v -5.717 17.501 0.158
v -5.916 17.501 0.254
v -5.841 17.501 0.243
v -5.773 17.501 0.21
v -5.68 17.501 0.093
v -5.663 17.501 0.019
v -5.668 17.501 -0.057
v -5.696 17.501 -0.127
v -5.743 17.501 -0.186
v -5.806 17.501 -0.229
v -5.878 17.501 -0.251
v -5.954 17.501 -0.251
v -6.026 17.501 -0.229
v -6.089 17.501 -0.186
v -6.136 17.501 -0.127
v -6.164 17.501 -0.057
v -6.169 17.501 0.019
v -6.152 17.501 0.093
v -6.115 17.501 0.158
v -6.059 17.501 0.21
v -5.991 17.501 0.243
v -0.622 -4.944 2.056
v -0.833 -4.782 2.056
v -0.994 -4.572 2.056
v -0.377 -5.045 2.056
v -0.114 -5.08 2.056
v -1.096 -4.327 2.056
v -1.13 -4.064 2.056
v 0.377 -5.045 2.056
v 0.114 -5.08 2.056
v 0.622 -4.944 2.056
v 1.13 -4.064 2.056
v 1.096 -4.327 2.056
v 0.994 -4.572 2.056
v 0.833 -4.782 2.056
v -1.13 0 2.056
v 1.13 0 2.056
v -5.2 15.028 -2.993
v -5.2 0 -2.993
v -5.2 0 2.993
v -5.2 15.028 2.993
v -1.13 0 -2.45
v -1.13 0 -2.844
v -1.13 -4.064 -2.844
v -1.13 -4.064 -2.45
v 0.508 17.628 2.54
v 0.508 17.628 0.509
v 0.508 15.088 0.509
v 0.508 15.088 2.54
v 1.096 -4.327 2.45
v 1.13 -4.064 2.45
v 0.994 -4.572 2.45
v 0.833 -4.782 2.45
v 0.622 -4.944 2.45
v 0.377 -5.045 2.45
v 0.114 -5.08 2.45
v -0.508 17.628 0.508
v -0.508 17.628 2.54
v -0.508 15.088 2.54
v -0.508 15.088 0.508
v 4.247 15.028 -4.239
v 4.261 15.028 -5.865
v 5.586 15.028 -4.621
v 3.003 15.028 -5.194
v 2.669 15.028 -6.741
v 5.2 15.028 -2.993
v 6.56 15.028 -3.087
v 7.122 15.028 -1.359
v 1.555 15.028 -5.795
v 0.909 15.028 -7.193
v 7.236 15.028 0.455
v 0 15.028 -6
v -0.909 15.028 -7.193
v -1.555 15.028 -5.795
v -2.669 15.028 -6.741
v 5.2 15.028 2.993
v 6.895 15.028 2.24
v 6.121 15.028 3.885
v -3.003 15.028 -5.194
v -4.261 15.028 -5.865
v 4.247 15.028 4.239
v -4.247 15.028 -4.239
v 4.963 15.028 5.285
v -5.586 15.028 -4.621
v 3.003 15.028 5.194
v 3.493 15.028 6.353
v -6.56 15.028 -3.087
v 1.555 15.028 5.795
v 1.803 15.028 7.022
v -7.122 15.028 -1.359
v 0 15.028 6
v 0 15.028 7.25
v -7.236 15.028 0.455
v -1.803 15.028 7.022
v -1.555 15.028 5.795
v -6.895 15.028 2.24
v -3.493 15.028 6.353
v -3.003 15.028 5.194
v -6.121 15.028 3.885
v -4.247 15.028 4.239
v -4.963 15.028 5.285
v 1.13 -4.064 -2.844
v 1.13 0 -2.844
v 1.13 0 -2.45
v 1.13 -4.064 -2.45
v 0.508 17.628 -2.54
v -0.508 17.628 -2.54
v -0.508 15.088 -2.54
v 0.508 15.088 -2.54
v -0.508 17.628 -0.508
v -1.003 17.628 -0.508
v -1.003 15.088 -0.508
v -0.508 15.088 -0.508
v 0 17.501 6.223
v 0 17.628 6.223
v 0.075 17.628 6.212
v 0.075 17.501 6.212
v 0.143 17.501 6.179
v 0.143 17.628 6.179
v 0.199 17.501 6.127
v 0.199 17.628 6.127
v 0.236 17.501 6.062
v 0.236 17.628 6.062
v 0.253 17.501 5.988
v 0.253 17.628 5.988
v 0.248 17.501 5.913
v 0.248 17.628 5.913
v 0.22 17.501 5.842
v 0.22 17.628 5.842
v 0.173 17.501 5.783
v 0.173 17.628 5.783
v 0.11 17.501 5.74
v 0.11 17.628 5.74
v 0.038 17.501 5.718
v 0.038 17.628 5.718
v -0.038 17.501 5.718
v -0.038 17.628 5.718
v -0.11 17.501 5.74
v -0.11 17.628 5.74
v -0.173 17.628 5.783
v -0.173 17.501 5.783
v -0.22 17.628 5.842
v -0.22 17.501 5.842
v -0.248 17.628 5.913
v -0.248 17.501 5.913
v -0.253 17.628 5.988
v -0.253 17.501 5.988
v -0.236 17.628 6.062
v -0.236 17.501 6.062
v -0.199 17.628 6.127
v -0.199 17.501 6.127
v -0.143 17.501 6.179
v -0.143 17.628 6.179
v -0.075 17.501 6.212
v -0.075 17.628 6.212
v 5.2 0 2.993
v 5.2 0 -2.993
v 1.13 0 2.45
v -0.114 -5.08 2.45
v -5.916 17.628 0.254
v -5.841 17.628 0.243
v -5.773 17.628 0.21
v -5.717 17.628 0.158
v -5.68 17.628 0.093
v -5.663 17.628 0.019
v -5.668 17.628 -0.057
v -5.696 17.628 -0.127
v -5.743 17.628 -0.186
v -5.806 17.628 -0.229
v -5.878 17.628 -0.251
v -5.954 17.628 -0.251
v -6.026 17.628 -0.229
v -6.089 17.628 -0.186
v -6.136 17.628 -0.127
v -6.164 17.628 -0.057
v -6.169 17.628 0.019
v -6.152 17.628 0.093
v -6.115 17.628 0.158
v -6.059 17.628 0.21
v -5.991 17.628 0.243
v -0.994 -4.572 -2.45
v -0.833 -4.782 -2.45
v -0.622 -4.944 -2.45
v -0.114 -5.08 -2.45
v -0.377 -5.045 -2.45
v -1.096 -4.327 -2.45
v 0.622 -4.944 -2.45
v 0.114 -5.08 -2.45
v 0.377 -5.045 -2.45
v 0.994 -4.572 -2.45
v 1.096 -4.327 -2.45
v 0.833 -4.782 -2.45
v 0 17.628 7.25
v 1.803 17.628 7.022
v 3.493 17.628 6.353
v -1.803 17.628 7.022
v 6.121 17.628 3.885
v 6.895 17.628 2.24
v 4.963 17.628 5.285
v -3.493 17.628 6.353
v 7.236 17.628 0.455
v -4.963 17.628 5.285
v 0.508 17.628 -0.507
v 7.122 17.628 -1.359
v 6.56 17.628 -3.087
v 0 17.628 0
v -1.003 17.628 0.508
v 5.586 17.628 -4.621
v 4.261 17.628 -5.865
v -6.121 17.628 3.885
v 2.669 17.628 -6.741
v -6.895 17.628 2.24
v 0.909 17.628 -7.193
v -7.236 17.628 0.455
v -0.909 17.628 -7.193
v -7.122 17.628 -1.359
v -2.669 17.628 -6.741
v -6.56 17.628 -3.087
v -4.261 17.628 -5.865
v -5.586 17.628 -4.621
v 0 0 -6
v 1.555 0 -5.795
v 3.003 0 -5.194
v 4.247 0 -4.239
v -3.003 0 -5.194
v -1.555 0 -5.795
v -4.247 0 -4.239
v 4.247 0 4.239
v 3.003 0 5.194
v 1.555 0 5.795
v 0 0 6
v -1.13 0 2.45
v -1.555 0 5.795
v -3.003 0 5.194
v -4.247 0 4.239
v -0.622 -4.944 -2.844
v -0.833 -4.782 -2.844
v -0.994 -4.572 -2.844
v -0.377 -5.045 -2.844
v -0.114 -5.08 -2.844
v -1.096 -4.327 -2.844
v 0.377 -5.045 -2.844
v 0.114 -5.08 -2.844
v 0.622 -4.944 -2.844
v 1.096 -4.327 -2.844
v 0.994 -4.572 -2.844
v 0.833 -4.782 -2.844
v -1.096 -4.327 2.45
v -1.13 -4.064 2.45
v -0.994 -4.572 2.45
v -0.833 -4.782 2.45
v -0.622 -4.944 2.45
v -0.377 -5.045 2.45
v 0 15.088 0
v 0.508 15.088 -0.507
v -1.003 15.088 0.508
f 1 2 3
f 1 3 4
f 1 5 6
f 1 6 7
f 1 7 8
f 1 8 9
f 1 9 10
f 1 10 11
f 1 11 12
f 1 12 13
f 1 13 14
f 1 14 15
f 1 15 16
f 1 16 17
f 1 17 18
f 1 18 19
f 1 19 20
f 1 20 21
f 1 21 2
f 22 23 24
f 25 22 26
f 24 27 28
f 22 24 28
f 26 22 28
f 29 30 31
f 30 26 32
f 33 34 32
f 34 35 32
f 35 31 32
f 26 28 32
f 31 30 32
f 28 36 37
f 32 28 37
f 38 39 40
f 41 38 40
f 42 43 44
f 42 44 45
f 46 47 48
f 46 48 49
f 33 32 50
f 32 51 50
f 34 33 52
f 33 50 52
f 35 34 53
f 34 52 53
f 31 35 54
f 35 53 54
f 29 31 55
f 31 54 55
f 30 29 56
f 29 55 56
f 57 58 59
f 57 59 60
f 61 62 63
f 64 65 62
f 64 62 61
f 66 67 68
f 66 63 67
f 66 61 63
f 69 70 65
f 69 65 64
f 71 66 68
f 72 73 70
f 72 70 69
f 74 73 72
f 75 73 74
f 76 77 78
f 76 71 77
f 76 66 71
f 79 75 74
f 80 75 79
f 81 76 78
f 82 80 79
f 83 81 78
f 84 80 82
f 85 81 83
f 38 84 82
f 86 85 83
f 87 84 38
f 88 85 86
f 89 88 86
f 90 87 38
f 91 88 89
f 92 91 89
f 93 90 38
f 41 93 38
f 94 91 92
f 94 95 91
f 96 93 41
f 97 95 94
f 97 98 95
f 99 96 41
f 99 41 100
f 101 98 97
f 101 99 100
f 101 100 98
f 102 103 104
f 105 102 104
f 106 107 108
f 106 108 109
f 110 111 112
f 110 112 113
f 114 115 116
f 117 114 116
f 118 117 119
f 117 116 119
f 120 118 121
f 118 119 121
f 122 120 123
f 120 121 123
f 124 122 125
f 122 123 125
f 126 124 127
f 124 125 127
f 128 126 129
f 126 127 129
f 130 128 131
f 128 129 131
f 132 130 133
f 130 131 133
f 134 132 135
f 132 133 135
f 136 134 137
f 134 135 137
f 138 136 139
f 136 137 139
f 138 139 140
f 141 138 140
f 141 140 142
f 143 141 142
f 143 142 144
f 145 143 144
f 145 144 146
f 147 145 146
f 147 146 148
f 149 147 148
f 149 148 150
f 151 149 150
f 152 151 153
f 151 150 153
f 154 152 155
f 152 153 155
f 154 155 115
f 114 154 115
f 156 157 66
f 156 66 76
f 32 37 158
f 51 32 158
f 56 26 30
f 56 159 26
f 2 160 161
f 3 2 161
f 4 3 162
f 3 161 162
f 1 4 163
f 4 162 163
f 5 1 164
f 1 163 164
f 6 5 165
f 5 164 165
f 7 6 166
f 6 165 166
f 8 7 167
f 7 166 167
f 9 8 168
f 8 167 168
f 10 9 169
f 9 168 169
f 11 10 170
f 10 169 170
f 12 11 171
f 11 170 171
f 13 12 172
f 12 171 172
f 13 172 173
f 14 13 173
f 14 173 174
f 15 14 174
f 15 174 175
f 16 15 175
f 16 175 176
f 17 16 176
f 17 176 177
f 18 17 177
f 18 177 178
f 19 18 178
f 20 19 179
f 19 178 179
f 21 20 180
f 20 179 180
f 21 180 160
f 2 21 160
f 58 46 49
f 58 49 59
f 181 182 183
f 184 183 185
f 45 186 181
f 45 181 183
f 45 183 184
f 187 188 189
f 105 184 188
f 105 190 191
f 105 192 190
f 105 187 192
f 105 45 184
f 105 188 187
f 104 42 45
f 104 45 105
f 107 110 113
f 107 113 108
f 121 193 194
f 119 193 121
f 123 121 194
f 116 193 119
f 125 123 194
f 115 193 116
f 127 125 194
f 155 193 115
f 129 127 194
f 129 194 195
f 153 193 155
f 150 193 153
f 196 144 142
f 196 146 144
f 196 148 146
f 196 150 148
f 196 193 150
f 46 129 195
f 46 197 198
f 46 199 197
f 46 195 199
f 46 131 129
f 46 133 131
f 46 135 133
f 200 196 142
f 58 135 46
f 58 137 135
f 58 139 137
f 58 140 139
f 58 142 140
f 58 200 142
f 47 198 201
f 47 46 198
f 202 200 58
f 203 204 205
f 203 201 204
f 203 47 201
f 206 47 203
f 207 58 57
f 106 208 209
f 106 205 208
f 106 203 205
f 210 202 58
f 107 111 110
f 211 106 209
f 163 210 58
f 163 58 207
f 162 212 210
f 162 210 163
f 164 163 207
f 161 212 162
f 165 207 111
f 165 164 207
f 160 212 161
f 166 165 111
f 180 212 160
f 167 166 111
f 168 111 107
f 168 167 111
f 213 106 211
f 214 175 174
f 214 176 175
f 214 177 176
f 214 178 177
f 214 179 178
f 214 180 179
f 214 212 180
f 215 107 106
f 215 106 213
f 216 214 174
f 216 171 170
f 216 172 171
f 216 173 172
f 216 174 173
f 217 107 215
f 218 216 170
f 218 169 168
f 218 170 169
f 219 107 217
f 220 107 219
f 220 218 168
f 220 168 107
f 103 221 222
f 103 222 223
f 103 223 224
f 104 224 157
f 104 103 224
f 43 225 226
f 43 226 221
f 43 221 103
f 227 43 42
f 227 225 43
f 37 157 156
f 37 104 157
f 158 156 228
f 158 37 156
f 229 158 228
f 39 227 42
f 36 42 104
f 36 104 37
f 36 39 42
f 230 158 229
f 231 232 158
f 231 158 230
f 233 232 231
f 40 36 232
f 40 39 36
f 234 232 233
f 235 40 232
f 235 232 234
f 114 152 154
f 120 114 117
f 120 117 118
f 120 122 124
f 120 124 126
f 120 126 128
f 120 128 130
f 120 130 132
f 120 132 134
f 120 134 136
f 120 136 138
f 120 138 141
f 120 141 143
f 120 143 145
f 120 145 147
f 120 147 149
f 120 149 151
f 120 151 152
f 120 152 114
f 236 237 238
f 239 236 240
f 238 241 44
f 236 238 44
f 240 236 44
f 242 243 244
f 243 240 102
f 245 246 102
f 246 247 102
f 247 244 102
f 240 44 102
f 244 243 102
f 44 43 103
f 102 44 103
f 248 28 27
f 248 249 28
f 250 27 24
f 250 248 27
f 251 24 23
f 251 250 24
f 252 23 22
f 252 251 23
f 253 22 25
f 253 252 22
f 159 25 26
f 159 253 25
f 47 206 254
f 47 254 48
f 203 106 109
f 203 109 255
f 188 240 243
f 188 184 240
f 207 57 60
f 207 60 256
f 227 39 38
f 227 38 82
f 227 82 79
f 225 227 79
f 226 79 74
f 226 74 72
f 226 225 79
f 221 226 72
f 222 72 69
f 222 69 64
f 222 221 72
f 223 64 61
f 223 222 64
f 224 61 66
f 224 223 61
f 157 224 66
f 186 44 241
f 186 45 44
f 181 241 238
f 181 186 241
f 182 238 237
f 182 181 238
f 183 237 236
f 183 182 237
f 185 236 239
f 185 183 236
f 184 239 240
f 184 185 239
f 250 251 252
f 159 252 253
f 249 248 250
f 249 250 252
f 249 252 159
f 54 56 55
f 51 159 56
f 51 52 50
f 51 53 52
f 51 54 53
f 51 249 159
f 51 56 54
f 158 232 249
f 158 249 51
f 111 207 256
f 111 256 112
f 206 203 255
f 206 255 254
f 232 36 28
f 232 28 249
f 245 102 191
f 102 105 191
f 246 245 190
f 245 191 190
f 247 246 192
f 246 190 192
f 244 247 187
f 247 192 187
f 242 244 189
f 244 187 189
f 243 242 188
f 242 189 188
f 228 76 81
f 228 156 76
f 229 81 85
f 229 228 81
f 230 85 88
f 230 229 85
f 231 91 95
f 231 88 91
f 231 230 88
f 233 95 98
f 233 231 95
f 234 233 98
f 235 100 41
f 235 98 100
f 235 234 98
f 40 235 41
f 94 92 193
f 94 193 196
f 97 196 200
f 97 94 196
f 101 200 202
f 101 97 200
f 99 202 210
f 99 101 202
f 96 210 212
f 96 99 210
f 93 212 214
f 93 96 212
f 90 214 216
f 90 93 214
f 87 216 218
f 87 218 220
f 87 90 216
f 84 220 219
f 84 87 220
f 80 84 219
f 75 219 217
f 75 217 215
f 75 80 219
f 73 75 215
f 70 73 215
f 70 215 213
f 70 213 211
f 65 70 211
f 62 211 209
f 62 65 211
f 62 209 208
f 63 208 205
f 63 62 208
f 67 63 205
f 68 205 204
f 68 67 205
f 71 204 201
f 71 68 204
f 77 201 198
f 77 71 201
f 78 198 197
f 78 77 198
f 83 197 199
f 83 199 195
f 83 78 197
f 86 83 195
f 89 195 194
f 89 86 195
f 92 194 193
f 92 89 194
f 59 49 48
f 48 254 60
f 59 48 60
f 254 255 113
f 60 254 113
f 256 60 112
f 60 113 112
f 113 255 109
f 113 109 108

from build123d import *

# Parameters (mm, degrees)
SKETCH2_W           = 3.302901435
SKETCH2_H           = 13.888103622
CUT_EXTRUDE1_DEPTH  = 15.0276
SKETCH3_W           = 2.2606
SKETCH3_H           = 0.3937
BOSS_EXTRUDE1_DEPTH = 5.08
FILLET1_R           = 1.016
CUT_EXTRUDE2_DEPTH  = 2.54
SKETCH5_R           = 0.254
CUT_EXTRUDE3_DEPTH  = 0.127


with BuildPart() as part:
    # Sketch1 → Revolve1 (revolve)
    with BuildSketch(Plane.XY, mode=Mode.PRIVATE) as revolve1_sk:
        Polygon((0, 17.6276), (-7.25, 17.6276), (-7.25, 15.0276), (-6, 15.0276), (-6, 0), (0, 0), align=None)
    revolve(revolve1_sk.sketch.rotate(Axis((0, 19.222907737, 0), (0, -1, 0)), 270), axis=Axis((0, 19.222907737, 0), (0, -1, 0)))

    # Sketch2 → Cut-Extrude1 (cut)
    with BuildSketch(Plane.XZ):
        with Locations((-6.851450718, -0.431101593)):
            Rectangle(SKETCH2_W, SKETCH2_H)
        with Locations((6.851450718, -0.431101593)):
            Rectangle(SKETCH2_W, SKETCH2_H)
    extrude(amount=-CUT_EXTRUDE1_DEPTH, mode=Mode.SUBTRACT)

    # Sketch3 → Boss-Extrude1 (add)
    with BuildSketch(Plane.XZ):
        with Locations((0, 2.25315)):
            Rectangle(SKETCH3_W, SKETCH3_H)
        with Locations((0, -2.64685)):
            Rectangle(SKETCH3_W, SKETCH3_H)
    extrude(amount=BOSS_EXTRUDE1_DEPTH)

    # Fillet1
    fillet1_edges = [part.edges().sort_by_distance(p)[0] for p in [
        (1.1303, -5.08, 2.25315),
        (-1.1303, -5.08, 2.25315),
        (1.1303, -5.08, -2.64685),
        (-1.1303, -5.08, -2.64685),
    ]]
    fillet(fillet1_edges, radius=FILLET1_R)

    # Sketch4 → Cut-Extrude2 (cut)
    with BuildSketch(Plane(origin=(0, 17.6276, 0), x_dir=(1, 0, 0), z_dir=(0, 1, 0))):
        Polygon((0.508, 2.54), (0.508, 0.506703339), (0, 0), (0.508, -0.509299979), (0.508, -2.54), (-0.508, -2.54), (-0.508, -0.508), (-1.003091962, -0.508), (-1.003091962, 0.508), (-0.508, 0.508), (-0.508, 2.54), align=None)
    extrude(amount=-CUT_EXTRUDE2_DEPTH, mode=Mode.SUBTRACT)

    # Sketch5 → Cut-Extrude3 (cut)
    with BuildSketch(Plane(origin=(0, 17.6276, 0), x_dir=(1, 0, 0), z_dir=(0, 1, 0))):
        with Locations(Location((-5.91604032, 0, 0), (0, 0, 270))):
            Circle(SKETCH5_R)
        with Locations(Location((0, -5.969098978, 0), (0, 0, 270))):
            Circle(SKETCH5_R)
    extrude(amount=-CUT_EXTRUDE3_DEPTH, mode=Mode.SUBTRACT)


solid = part.part
